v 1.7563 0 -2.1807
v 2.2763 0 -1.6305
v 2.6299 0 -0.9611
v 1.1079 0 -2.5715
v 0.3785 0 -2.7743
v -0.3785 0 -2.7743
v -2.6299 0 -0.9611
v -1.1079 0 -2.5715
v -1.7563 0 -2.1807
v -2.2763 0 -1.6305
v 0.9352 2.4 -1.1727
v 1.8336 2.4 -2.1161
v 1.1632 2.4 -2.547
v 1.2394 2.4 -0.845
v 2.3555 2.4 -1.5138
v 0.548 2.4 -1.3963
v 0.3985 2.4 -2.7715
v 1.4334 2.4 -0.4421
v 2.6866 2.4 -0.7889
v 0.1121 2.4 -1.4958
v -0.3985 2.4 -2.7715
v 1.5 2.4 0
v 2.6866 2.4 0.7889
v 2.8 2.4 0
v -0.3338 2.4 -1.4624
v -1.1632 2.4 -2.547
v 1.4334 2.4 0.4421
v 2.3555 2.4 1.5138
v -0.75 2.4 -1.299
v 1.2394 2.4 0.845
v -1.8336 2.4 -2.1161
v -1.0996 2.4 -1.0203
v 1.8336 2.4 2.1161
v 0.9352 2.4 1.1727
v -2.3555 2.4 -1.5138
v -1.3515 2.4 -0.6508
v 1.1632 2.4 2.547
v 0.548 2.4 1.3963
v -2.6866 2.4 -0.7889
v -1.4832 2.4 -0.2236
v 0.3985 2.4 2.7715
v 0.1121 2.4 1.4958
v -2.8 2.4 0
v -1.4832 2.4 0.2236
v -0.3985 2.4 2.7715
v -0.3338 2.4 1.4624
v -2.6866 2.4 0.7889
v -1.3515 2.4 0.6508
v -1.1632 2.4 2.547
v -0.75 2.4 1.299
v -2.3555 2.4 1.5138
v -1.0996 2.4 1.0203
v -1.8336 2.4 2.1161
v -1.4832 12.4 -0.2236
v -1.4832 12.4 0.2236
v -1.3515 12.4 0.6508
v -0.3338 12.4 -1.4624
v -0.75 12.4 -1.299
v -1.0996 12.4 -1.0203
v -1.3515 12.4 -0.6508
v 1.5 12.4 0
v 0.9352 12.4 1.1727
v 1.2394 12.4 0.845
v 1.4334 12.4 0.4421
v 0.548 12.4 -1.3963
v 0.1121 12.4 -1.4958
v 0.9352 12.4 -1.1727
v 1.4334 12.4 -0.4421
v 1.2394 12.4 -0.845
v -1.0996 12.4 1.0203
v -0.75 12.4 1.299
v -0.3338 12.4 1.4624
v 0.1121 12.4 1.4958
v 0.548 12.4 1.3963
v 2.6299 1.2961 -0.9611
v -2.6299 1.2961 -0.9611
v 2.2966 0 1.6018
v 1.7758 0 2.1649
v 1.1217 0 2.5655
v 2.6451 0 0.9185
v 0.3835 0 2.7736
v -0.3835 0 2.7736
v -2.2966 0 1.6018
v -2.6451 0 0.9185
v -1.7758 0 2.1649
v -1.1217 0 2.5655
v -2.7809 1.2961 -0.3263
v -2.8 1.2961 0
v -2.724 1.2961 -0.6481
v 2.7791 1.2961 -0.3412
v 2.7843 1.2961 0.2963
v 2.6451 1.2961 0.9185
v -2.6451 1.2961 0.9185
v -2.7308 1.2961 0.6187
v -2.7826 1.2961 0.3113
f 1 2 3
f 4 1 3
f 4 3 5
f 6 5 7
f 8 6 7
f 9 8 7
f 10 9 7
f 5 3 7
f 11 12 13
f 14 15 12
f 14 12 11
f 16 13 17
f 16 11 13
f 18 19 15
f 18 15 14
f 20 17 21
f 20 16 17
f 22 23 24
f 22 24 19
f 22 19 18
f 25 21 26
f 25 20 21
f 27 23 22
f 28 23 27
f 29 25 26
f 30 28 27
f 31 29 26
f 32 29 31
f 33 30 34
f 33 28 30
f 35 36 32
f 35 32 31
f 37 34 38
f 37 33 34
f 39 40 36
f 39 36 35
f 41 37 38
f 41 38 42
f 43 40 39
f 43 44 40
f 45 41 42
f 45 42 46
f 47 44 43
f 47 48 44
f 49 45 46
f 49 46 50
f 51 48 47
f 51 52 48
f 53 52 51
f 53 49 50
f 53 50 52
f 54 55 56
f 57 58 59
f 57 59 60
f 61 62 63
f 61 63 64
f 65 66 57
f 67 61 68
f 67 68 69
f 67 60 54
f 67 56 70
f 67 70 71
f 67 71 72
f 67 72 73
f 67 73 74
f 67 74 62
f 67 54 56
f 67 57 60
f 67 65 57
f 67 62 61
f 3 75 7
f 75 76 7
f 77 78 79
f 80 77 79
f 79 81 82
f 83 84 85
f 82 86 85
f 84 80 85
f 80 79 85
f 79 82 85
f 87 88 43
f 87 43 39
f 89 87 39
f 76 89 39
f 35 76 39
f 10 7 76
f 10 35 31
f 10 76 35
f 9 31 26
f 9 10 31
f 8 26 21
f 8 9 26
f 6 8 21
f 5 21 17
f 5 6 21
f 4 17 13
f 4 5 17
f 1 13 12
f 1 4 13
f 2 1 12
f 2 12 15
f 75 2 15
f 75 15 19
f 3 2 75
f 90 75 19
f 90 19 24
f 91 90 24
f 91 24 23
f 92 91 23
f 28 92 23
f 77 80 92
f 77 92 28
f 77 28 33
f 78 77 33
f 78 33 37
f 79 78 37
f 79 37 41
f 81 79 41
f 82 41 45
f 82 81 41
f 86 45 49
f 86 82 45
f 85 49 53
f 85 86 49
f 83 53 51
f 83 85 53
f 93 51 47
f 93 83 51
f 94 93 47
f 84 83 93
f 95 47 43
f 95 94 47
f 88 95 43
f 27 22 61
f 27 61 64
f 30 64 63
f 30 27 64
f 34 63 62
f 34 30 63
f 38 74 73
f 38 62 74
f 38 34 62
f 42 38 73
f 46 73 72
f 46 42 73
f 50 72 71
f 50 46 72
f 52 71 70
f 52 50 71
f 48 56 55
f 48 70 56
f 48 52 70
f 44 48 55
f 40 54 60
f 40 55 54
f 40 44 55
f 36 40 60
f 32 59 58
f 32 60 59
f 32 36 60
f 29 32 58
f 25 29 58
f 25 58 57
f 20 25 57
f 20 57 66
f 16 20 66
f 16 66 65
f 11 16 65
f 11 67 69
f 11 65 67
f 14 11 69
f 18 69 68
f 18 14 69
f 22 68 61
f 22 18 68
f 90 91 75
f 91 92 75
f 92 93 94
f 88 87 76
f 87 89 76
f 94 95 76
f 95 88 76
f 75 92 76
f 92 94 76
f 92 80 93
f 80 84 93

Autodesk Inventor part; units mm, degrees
ref_plane "YZ Plane" through (0, 0, 0) normal (1, 0, 0) x (0, 1, 0)
ref_plane "XZ Plane" through (0, 0, 0) normal (0, 1, 0) x (-1, 0, 0)
ref_plane "XY Plane" through (0, 0, 0) normal (0, 0, 1) x (1, 0, 0)
sketch "Esboço1" plane through (0, 0, 0) normal (0, 1, 0) x (-1, 0, 0)
  circle A0 centre (0, 0) radius 2.8
  dimension "d0" = 5.6
extrude "Extrusão1" add sketch "Esboço1" along normal blind 2.4
sketch "Esboço2" plane through (0, 0, 0) normal (1, 0, 0) x (0, 1, 0)
  line L0 (0, 0.9185) -> (1.2961, 0.9185)
  line L1 (1.2961, 0.9185) -> (1.2961, -0.9611)
  line L2 (1.2961, -0.9611) -> (0, -0.9611)
  line L3 (0, -0.9611) -> (0, 0.9185)
  point P0 (0, 0)
extrude "Extrusão2" cut sketch "Esboço2" along normal through all both and the other way through all
sketch "Esboço3" plane through (0, 2.4, 0) normal (0, 1, 0) x (1, 0, 0)
  circle A0 centre (0, 0) radius 2.8 projected
  circle A1 centre (0, 0) radius 1.5
  dimension "d5" = 3
extrude "Extrusão3" add sketch "Esboço3" along normal blind 10 contours A1
thread "Rosca1" size "M3x0.5" class "6g" standard "ANSI Metric M Profile" full length
properties part number "AA-Parafuso-M3-30"
